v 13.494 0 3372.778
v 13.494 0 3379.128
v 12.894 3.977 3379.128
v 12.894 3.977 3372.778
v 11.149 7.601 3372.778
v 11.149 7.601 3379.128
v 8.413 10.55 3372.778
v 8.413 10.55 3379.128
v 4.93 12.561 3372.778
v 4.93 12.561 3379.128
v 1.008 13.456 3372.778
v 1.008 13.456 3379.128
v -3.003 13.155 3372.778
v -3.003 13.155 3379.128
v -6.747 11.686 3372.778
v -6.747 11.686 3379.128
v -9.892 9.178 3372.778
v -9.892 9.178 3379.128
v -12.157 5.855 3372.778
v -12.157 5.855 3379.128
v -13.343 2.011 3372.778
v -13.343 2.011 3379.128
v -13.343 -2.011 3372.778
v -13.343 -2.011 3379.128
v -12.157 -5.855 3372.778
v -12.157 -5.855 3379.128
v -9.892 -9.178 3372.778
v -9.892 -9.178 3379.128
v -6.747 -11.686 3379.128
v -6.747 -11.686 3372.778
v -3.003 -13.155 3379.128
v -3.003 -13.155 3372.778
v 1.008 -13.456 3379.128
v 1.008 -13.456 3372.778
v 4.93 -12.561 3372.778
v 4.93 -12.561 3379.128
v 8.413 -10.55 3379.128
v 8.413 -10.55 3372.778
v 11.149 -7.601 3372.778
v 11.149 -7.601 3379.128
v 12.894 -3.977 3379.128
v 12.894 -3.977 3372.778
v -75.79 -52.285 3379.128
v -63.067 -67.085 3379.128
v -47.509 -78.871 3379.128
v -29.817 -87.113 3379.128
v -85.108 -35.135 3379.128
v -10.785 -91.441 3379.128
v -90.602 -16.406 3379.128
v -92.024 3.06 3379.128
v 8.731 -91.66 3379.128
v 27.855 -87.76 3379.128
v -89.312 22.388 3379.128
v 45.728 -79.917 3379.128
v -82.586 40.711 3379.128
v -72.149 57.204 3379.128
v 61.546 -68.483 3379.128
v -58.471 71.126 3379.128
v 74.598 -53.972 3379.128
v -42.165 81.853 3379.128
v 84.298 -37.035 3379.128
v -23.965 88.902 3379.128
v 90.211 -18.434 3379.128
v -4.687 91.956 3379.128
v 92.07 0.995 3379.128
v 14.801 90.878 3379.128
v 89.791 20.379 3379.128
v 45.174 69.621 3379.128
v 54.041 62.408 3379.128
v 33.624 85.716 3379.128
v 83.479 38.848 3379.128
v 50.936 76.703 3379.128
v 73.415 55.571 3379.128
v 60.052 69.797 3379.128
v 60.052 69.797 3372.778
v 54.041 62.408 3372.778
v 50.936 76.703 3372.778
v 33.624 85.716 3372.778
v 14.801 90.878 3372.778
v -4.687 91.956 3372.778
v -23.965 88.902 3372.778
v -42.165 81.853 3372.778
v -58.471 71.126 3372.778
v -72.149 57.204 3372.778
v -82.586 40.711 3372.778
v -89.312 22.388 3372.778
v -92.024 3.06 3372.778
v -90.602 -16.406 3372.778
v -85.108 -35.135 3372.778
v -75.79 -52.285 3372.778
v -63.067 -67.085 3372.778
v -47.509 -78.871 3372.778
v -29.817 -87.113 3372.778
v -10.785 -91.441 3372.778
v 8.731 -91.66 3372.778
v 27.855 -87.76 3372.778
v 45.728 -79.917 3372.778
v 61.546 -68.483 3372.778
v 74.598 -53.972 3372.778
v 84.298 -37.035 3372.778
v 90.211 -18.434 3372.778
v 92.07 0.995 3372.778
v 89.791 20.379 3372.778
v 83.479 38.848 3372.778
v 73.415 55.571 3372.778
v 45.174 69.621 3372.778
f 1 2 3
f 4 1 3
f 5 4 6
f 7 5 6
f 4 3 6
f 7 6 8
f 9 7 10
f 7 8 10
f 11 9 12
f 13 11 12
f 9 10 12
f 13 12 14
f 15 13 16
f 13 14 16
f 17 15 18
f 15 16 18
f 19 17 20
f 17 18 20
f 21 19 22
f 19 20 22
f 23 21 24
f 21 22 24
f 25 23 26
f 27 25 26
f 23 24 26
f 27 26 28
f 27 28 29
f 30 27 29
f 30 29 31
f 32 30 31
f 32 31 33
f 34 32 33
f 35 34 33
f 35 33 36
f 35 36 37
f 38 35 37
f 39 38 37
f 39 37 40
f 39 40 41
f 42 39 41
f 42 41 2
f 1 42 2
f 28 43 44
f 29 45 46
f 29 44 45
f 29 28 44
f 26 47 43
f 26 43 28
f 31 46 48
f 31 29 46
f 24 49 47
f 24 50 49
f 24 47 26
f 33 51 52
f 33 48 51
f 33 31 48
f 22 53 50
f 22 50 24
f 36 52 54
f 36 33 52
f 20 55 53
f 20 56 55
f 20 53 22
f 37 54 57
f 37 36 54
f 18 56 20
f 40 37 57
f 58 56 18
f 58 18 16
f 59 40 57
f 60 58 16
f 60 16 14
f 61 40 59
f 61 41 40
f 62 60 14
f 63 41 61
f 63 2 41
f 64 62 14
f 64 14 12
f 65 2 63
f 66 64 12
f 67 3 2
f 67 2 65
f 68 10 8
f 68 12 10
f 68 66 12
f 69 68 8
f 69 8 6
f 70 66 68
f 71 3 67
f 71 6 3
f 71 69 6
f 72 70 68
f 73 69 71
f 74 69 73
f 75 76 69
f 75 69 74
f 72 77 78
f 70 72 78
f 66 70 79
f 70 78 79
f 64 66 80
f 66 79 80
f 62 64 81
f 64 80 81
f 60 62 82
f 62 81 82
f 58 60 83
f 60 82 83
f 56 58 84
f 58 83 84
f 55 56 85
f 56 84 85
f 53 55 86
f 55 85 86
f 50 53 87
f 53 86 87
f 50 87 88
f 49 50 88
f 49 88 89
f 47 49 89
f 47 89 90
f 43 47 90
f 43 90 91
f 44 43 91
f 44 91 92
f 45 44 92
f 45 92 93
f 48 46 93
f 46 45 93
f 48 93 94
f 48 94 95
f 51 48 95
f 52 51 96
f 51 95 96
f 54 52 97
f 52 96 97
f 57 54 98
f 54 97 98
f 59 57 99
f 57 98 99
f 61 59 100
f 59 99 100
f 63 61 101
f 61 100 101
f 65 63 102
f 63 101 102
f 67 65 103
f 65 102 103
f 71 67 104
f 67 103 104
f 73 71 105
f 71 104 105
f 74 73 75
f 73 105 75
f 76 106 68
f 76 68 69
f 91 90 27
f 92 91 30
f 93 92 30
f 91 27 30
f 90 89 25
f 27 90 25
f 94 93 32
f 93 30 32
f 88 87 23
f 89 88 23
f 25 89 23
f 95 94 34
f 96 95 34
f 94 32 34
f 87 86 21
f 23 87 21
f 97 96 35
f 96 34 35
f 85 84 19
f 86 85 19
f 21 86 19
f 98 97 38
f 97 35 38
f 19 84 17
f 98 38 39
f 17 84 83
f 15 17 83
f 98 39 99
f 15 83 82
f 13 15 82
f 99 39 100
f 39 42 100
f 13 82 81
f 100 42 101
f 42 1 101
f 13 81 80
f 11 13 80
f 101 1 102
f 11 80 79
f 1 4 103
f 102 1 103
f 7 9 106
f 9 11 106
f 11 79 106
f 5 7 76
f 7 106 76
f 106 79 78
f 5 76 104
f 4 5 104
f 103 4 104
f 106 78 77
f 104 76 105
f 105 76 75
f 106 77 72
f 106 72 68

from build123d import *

# Parameters (mm, degrees)
SKETCH1_R               = 92.075
BOSS_EXTRUDE1_DEPTH     = 6.35
CUT_EXTRUDE1_REACH      = 132.368
SKETCH2_R               = 13.49375
CUT_EXTRUDE2_DEPTH      = 131.368453815
CUT_EXTRUDE2_DEPTH_BACK = 131.368453815


with BuildPart() as part:
    # Sketch1 → Boss-Extrude1 (new body)
    with BuildSketch(Plane.XY.offset(3372.777793208)):
        Circle(SKETCH1_R)
    extrude(amount=BOSS_EXTRUDE1_DEPTH)

    # Sketch2 → Cut-Extrude1 (cut, up to next)
    with BuildSketch(Plane.XY.offset(3379.127793208), mode=Mode.PRIVATE) as cut_extrude1_sk1:
        Circle(SKETCH2_R)
    cut_extrude1_tool1 = extrude(cut_extrude1_sk1.sketch, amount=-CUT_EXTRUDE1_REACH, mode=Mode.PRIVATE) & part.part
    add(cut_extrude1_tool1.solids().sort_by_distance((0, 0, 3379.127793))[0], mode=Mode.SUBTRACT)

    # Sketch3 → Cut-Extrude2 (cut, two sides: drawn at the far end of the back side and taken through both)
    with BuildSketch(Plane.XY.offset(3379.127793208).offset(-CUT_EXTRUDE2_DEPTH_BACK)):
        Polygon((337.604296064, 429.104456568), (50.93576887, 76.70301868), (45.174400493, 69.620572204), (54.041166162, 62.407711012), (60.051883822, 69.796682403), (346.720411016, 422.198120291), (895.364622285, 1146.388703686), (886.248507333, 1153.295039963), align=None)
    extrude(amount=CUT_EXTRUDE2_DEPTH + CUT_EXTRUDE2_DEPTH_BACK, mode=Mode.SUBTRACT)


solid = part.part
